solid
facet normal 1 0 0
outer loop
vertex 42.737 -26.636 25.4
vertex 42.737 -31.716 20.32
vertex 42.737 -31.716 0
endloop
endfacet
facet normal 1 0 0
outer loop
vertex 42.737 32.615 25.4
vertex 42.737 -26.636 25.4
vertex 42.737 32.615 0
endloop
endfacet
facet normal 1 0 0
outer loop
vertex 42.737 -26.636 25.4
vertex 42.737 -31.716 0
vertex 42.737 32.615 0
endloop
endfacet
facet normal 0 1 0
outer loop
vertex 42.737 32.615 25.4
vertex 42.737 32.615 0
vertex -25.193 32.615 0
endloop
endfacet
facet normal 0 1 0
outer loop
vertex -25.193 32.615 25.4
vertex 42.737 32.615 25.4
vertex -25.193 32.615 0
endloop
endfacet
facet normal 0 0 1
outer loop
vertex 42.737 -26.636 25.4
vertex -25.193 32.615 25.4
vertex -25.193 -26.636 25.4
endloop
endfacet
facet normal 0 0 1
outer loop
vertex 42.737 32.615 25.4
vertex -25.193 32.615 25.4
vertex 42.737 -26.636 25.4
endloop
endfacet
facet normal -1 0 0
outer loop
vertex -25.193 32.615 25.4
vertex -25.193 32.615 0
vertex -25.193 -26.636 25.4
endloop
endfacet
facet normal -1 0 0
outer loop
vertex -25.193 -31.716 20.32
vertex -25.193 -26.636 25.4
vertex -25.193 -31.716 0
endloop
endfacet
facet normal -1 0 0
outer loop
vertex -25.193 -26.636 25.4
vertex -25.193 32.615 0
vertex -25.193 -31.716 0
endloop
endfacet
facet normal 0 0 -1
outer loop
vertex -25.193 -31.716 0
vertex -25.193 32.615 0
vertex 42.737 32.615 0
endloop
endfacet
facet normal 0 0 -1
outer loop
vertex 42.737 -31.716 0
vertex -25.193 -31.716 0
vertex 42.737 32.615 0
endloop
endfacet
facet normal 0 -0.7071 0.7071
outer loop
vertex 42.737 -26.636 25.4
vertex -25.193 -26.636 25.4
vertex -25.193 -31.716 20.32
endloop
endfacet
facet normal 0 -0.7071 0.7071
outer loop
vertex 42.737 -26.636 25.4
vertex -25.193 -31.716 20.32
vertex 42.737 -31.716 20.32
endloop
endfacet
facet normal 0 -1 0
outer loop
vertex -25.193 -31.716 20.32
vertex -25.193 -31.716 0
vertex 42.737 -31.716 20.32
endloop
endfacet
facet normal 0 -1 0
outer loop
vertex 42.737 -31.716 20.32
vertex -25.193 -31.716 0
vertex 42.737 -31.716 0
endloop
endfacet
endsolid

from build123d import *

# Parameters (mm, degrees)
F1_DEPTH = 25.4
F2_SIZE  = 5.08


with BuildPart() as f1:
    # F0 (on Top) → F1 (new body)
    with BuildSketch(Plane.XY):
        Polygon((42.737432, 32.615412), (-25.192585, 32.615412), (-25.192585, -31.715661), (8.772423, -31.715661), (42.737432, -31.715661), align=None)
    extrude(amount=F1_DEPTH)

    # F2
    f2_edges = [f1.edges().sort_by_distance(p)[0] for p in [
        (8.772423, -31.715661, 25.4),
    ]]
    chamfer(f2_edges, length=F2_SIZE)


solid = f1.part
